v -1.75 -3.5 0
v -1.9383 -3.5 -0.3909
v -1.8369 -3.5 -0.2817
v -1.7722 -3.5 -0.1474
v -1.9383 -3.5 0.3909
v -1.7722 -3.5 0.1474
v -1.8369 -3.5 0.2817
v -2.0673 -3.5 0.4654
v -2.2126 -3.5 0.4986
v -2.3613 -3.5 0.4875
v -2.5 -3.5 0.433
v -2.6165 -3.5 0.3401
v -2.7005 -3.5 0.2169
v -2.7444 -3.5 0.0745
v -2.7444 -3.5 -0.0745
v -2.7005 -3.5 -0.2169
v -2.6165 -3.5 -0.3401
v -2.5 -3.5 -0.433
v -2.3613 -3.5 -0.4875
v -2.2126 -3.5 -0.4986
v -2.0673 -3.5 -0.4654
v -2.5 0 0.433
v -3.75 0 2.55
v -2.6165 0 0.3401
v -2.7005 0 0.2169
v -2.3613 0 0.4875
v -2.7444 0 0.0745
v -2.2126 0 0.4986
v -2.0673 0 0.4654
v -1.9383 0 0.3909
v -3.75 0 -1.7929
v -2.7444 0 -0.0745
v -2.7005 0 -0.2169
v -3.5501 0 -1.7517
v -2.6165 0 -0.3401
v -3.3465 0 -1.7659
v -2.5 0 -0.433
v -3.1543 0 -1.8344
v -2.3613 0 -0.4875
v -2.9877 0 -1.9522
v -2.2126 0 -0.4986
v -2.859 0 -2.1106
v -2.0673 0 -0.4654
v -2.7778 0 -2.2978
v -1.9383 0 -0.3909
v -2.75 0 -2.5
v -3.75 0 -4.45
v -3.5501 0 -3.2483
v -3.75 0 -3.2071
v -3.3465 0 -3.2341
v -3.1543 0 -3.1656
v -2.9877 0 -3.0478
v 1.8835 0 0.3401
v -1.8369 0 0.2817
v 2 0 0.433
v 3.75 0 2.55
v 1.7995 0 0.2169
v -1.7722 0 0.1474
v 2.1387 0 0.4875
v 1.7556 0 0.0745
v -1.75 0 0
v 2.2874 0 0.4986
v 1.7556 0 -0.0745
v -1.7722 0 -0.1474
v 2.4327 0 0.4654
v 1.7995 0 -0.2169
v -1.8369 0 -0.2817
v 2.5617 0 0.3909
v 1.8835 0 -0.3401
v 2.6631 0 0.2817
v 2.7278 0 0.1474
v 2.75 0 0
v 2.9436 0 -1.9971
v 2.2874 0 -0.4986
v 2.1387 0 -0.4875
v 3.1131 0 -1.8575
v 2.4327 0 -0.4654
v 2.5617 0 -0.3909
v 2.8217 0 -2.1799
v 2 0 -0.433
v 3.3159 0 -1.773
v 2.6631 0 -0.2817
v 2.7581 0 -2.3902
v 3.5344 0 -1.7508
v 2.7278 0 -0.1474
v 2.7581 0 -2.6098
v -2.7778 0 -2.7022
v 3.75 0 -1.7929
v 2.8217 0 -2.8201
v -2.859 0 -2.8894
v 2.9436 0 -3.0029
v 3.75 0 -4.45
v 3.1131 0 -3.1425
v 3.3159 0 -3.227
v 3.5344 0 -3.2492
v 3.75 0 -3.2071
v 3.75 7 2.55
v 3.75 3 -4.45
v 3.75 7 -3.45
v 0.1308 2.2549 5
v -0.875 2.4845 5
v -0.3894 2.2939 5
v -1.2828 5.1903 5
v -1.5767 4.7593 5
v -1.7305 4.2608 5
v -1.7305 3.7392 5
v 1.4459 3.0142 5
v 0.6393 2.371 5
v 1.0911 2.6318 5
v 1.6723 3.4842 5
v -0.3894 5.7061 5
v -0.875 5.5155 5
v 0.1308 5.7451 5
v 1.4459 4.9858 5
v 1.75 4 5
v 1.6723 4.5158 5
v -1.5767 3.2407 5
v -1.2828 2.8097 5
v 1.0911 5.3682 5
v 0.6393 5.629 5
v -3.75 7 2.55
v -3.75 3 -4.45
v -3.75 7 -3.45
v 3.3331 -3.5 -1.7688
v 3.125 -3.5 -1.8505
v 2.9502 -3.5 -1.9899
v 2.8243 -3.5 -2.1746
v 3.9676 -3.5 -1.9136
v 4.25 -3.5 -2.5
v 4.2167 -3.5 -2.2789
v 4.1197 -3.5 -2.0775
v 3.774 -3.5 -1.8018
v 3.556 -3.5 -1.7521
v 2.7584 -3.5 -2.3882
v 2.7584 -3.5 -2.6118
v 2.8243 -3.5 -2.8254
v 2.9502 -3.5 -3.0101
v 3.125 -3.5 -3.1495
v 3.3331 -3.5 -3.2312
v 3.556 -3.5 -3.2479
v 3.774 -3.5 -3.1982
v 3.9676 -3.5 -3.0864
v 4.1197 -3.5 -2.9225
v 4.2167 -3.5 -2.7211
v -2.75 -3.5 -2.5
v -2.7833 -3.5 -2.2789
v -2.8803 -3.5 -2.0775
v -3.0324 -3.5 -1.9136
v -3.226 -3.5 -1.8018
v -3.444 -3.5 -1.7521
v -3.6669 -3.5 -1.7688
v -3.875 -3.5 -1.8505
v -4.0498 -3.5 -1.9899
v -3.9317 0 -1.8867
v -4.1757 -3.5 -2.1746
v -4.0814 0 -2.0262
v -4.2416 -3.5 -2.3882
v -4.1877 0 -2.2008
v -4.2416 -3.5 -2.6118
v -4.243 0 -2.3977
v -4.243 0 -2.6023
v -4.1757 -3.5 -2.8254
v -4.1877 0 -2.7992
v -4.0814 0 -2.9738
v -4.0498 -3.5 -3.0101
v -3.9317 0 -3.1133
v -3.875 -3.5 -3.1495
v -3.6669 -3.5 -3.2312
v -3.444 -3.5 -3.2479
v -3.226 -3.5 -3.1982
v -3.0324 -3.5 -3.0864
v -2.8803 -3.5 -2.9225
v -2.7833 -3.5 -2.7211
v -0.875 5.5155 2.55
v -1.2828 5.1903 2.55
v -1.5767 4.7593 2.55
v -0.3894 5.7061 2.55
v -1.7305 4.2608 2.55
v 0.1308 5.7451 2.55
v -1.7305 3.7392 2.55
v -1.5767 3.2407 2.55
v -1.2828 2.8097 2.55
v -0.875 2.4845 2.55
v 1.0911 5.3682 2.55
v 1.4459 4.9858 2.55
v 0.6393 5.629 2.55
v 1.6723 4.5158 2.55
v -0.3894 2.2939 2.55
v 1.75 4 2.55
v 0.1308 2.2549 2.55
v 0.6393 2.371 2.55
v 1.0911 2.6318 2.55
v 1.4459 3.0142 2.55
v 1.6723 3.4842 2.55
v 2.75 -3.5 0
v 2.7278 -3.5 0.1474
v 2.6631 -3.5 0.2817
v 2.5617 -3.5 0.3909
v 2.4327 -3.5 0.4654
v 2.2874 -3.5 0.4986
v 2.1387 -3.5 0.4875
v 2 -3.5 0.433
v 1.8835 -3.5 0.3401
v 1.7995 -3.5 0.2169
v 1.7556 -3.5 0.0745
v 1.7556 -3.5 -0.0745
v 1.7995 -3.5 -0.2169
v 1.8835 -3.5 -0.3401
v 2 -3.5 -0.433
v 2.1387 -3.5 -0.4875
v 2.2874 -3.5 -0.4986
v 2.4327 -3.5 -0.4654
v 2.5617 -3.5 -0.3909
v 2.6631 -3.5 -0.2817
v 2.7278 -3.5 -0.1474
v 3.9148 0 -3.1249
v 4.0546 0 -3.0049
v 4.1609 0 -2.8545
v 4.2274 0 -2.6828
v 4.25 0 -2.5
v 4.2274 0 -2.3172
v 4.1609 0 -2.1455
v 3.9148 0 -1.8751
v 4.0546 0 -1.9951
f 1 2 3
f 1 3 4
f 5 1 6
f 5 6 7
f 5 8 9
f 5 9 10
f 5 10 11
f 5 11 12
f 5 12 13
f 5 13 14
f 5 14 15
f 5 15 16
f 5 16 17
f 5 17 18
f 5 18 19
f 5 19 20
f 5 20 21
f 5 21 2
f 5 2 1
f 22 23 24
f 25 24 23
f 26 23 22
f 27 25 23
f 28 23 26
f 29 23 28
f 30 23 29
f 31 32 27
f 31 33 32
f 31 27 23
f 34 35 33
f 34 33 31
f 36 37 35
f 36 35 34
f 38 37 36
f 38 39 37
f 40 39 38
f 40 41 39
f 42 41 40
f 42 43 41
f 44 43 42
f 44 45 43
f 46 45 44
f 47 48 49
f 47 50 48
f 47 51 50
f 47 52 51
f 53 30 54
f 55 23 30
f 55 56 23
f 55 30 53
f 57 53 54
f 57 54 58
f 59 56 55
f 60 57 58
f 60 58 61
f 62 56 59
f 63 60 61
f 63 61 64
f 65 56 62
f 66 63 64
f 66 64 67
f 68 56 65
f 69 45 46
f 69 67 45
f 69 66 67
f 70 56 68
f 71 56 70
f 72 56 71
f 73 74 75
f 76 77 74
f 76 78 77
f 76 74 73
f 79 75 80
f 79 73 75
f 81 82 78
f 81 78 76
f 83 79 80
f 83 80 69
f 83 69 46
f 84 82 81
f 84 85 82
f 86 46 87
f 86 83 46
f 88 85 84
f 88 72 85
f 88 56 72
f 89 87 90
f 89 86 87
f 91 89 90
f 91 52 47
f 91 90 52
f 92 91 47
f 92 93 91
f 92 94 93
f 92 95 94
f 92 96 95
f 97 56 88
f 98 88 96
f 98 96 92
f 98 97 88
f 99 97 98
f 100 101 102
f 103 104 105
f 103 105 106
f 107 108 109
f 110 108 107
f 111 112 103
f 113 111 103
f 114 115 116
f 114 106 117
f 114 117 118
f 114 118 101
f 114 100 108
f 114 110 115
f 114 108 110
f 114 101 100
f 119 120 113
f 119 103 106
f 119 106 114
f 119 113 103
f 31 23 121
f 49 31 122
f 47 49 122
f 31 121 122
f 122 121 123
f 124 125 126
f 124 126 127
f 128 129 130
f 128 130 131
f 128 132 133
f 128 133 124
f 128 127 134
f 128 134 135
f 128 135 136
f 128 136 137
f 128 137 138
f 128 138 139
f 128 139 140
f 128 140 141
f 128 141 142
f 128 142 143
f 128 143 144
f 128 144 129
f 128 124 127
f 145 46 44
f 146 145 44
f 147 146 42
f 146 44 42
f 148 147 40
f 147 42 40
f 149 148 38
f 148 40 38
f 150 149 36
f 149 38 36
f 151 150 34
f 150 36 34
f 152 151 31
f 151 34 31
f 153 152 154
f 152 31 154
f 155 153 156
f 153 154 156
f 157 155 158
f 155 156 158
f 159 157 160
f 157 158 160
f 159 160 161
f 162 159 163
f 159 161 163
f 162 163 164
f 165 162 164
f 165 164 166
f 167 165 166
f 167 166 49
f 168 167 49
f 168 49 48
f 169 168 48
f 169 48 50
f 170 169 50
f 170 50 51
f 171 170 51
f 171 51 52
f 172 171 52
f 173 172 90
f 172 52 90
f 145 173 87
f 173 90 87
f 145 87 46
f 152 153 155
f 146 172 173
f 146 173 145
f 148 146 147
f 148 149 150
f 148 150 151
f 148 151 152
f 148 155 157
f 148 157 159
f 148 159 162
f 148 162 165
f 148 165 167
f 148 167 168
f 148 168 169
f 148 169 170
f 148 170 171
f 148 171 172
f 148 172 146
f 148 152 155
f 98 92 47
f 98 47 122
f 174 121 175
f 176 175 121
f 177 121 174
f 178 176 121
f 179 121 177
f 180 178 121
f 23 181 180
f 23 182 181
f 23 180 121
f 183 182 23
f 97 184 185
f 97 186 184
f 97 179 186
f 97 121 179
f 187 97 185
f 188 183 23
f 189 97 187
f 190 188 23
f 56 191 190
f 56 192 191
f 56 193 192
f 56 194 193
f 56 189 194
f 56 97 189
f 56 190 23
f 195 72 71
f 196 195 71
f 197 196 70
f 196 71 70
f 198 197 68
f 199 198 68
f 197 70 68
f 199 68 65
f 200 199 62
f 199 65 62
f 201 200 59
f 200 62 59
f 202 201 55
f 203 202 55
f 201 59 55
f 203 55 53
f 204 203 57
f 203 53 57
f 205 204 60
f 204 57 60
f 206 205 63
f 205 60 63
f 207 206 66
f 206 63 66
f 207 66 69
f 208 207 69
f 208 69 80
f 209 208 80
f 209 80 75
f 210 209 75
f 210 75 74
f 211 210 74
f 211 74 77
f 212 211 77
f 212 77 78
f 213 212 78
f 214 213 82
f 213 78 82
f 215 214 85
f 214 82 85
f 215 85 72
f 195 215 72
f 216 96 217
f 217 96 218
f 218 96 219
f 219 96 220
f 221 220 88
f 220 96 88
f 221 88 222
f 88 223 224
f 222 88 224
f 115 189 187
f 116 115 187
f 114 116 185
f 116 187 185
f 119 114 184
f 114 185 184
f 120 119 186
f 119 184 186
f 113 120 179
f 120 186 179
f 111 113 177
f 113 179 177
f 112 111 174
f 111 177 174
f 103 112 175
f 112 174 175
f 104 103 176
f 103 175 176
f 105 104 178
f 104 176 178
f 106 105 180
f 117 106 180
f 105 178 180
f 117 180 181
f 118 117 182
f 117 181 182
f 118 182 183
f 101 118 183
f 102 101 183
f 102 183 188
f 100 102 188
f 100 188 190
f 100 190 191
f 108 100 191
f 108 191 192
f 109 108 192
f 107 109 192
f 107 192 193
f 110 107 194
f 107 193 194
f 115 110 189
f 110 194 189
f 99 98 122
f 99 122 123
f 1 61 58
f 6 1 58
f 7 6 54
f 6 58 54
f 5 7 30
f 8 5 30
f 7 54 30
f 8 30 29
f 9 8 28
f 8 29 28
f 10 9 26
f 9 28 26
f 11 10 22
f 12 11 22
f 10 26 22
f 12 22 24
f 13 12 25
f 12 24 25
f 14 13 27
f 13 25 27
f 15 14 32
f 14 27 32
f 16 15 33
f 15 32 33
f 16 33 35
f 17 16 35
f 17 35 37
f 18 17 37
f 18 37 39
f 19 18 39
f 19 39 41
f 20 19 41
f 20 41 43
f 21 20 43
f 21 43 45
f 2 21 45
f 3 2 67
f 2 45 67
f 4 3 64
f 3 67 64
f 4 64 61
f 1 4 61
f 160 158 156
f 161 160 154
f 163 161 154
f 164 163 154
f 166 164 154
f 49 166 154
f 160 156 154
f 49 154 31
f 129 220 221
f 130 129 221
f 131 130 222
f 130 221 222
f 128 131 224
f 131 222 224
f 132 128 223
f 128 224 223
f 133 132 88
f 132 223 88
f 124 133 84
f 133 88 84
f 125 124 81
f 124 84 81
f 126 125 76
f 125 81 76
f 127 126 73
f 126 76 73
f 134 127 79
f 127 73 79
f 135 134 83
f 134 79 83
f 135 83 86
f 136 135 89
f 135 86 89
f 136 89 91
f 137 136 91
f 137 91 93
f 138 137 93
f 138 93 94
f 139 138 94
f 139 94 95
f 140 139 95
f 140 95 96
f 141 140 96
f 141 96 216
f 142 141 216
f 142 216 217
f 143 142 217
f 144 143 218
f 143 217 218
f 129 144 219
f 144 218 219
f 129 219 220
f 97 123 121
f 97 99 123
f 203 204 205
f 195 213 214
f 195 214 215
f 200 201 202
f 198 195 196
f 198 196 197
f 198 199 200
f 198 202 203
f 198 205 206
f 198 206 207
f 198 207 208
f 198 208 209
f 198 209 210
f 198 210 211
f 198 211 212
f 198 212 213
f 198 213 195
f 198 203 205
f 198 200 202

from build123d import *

# Parameters (mm, degrees)
EXTRUDE_1_DEPTH = 3.75
SKETCH_4_R      = 0.75
SKETCH_4_R_2    = 0.5
EXTRUDE_3_DEPTH = 3.5
SKETCH_3_R      = 1.75
EXTRUDE_2_DEPTH = 2.45


with BuildPart() as part:
    # 草图2 → 凸台-拉伸1 (new body, symmetric)
    with BuildSketch(Plane(origin=(0, 0, 0), x_dir=(0, 0, -1), z_dir=(1, 0, 0))):
        Polygon((-2.55, 0), (4.45, 0), (4.45, 3), (3.45, 7), (-2.55, 7), align=None)
    extrude(amount=EXTRUDE_1_DEPTH, both=True)

    # 草图4 → 凸台-拉伸3 (add)
    with BuildSketch(Plane.XZ):
        with Locations((-3.5, -2.5)):
            Circle(SKETCH_4_R)
        with Locations((-2.25, 0)):
            Circle(SKETCH_4_R_2)
        with Locations((2.25, 0)):
            Circle(SKETCH_4_R_2)
        with Locations((3.5, -2.5)):
            Circle(SKETCH_4_R)
    extrude(amount=EXTRUDE_3_DEPTH)

    # 草图3 → 凸台-拉伸2 (add)
    with BuildSketch(Plane.XY.offset(2.55)):
        with Locations((0, 4)):
            Circle(SKETCH_3_R)
    extrude(amount=EXTRUDE_2_DEPTH)


solid = part.part
